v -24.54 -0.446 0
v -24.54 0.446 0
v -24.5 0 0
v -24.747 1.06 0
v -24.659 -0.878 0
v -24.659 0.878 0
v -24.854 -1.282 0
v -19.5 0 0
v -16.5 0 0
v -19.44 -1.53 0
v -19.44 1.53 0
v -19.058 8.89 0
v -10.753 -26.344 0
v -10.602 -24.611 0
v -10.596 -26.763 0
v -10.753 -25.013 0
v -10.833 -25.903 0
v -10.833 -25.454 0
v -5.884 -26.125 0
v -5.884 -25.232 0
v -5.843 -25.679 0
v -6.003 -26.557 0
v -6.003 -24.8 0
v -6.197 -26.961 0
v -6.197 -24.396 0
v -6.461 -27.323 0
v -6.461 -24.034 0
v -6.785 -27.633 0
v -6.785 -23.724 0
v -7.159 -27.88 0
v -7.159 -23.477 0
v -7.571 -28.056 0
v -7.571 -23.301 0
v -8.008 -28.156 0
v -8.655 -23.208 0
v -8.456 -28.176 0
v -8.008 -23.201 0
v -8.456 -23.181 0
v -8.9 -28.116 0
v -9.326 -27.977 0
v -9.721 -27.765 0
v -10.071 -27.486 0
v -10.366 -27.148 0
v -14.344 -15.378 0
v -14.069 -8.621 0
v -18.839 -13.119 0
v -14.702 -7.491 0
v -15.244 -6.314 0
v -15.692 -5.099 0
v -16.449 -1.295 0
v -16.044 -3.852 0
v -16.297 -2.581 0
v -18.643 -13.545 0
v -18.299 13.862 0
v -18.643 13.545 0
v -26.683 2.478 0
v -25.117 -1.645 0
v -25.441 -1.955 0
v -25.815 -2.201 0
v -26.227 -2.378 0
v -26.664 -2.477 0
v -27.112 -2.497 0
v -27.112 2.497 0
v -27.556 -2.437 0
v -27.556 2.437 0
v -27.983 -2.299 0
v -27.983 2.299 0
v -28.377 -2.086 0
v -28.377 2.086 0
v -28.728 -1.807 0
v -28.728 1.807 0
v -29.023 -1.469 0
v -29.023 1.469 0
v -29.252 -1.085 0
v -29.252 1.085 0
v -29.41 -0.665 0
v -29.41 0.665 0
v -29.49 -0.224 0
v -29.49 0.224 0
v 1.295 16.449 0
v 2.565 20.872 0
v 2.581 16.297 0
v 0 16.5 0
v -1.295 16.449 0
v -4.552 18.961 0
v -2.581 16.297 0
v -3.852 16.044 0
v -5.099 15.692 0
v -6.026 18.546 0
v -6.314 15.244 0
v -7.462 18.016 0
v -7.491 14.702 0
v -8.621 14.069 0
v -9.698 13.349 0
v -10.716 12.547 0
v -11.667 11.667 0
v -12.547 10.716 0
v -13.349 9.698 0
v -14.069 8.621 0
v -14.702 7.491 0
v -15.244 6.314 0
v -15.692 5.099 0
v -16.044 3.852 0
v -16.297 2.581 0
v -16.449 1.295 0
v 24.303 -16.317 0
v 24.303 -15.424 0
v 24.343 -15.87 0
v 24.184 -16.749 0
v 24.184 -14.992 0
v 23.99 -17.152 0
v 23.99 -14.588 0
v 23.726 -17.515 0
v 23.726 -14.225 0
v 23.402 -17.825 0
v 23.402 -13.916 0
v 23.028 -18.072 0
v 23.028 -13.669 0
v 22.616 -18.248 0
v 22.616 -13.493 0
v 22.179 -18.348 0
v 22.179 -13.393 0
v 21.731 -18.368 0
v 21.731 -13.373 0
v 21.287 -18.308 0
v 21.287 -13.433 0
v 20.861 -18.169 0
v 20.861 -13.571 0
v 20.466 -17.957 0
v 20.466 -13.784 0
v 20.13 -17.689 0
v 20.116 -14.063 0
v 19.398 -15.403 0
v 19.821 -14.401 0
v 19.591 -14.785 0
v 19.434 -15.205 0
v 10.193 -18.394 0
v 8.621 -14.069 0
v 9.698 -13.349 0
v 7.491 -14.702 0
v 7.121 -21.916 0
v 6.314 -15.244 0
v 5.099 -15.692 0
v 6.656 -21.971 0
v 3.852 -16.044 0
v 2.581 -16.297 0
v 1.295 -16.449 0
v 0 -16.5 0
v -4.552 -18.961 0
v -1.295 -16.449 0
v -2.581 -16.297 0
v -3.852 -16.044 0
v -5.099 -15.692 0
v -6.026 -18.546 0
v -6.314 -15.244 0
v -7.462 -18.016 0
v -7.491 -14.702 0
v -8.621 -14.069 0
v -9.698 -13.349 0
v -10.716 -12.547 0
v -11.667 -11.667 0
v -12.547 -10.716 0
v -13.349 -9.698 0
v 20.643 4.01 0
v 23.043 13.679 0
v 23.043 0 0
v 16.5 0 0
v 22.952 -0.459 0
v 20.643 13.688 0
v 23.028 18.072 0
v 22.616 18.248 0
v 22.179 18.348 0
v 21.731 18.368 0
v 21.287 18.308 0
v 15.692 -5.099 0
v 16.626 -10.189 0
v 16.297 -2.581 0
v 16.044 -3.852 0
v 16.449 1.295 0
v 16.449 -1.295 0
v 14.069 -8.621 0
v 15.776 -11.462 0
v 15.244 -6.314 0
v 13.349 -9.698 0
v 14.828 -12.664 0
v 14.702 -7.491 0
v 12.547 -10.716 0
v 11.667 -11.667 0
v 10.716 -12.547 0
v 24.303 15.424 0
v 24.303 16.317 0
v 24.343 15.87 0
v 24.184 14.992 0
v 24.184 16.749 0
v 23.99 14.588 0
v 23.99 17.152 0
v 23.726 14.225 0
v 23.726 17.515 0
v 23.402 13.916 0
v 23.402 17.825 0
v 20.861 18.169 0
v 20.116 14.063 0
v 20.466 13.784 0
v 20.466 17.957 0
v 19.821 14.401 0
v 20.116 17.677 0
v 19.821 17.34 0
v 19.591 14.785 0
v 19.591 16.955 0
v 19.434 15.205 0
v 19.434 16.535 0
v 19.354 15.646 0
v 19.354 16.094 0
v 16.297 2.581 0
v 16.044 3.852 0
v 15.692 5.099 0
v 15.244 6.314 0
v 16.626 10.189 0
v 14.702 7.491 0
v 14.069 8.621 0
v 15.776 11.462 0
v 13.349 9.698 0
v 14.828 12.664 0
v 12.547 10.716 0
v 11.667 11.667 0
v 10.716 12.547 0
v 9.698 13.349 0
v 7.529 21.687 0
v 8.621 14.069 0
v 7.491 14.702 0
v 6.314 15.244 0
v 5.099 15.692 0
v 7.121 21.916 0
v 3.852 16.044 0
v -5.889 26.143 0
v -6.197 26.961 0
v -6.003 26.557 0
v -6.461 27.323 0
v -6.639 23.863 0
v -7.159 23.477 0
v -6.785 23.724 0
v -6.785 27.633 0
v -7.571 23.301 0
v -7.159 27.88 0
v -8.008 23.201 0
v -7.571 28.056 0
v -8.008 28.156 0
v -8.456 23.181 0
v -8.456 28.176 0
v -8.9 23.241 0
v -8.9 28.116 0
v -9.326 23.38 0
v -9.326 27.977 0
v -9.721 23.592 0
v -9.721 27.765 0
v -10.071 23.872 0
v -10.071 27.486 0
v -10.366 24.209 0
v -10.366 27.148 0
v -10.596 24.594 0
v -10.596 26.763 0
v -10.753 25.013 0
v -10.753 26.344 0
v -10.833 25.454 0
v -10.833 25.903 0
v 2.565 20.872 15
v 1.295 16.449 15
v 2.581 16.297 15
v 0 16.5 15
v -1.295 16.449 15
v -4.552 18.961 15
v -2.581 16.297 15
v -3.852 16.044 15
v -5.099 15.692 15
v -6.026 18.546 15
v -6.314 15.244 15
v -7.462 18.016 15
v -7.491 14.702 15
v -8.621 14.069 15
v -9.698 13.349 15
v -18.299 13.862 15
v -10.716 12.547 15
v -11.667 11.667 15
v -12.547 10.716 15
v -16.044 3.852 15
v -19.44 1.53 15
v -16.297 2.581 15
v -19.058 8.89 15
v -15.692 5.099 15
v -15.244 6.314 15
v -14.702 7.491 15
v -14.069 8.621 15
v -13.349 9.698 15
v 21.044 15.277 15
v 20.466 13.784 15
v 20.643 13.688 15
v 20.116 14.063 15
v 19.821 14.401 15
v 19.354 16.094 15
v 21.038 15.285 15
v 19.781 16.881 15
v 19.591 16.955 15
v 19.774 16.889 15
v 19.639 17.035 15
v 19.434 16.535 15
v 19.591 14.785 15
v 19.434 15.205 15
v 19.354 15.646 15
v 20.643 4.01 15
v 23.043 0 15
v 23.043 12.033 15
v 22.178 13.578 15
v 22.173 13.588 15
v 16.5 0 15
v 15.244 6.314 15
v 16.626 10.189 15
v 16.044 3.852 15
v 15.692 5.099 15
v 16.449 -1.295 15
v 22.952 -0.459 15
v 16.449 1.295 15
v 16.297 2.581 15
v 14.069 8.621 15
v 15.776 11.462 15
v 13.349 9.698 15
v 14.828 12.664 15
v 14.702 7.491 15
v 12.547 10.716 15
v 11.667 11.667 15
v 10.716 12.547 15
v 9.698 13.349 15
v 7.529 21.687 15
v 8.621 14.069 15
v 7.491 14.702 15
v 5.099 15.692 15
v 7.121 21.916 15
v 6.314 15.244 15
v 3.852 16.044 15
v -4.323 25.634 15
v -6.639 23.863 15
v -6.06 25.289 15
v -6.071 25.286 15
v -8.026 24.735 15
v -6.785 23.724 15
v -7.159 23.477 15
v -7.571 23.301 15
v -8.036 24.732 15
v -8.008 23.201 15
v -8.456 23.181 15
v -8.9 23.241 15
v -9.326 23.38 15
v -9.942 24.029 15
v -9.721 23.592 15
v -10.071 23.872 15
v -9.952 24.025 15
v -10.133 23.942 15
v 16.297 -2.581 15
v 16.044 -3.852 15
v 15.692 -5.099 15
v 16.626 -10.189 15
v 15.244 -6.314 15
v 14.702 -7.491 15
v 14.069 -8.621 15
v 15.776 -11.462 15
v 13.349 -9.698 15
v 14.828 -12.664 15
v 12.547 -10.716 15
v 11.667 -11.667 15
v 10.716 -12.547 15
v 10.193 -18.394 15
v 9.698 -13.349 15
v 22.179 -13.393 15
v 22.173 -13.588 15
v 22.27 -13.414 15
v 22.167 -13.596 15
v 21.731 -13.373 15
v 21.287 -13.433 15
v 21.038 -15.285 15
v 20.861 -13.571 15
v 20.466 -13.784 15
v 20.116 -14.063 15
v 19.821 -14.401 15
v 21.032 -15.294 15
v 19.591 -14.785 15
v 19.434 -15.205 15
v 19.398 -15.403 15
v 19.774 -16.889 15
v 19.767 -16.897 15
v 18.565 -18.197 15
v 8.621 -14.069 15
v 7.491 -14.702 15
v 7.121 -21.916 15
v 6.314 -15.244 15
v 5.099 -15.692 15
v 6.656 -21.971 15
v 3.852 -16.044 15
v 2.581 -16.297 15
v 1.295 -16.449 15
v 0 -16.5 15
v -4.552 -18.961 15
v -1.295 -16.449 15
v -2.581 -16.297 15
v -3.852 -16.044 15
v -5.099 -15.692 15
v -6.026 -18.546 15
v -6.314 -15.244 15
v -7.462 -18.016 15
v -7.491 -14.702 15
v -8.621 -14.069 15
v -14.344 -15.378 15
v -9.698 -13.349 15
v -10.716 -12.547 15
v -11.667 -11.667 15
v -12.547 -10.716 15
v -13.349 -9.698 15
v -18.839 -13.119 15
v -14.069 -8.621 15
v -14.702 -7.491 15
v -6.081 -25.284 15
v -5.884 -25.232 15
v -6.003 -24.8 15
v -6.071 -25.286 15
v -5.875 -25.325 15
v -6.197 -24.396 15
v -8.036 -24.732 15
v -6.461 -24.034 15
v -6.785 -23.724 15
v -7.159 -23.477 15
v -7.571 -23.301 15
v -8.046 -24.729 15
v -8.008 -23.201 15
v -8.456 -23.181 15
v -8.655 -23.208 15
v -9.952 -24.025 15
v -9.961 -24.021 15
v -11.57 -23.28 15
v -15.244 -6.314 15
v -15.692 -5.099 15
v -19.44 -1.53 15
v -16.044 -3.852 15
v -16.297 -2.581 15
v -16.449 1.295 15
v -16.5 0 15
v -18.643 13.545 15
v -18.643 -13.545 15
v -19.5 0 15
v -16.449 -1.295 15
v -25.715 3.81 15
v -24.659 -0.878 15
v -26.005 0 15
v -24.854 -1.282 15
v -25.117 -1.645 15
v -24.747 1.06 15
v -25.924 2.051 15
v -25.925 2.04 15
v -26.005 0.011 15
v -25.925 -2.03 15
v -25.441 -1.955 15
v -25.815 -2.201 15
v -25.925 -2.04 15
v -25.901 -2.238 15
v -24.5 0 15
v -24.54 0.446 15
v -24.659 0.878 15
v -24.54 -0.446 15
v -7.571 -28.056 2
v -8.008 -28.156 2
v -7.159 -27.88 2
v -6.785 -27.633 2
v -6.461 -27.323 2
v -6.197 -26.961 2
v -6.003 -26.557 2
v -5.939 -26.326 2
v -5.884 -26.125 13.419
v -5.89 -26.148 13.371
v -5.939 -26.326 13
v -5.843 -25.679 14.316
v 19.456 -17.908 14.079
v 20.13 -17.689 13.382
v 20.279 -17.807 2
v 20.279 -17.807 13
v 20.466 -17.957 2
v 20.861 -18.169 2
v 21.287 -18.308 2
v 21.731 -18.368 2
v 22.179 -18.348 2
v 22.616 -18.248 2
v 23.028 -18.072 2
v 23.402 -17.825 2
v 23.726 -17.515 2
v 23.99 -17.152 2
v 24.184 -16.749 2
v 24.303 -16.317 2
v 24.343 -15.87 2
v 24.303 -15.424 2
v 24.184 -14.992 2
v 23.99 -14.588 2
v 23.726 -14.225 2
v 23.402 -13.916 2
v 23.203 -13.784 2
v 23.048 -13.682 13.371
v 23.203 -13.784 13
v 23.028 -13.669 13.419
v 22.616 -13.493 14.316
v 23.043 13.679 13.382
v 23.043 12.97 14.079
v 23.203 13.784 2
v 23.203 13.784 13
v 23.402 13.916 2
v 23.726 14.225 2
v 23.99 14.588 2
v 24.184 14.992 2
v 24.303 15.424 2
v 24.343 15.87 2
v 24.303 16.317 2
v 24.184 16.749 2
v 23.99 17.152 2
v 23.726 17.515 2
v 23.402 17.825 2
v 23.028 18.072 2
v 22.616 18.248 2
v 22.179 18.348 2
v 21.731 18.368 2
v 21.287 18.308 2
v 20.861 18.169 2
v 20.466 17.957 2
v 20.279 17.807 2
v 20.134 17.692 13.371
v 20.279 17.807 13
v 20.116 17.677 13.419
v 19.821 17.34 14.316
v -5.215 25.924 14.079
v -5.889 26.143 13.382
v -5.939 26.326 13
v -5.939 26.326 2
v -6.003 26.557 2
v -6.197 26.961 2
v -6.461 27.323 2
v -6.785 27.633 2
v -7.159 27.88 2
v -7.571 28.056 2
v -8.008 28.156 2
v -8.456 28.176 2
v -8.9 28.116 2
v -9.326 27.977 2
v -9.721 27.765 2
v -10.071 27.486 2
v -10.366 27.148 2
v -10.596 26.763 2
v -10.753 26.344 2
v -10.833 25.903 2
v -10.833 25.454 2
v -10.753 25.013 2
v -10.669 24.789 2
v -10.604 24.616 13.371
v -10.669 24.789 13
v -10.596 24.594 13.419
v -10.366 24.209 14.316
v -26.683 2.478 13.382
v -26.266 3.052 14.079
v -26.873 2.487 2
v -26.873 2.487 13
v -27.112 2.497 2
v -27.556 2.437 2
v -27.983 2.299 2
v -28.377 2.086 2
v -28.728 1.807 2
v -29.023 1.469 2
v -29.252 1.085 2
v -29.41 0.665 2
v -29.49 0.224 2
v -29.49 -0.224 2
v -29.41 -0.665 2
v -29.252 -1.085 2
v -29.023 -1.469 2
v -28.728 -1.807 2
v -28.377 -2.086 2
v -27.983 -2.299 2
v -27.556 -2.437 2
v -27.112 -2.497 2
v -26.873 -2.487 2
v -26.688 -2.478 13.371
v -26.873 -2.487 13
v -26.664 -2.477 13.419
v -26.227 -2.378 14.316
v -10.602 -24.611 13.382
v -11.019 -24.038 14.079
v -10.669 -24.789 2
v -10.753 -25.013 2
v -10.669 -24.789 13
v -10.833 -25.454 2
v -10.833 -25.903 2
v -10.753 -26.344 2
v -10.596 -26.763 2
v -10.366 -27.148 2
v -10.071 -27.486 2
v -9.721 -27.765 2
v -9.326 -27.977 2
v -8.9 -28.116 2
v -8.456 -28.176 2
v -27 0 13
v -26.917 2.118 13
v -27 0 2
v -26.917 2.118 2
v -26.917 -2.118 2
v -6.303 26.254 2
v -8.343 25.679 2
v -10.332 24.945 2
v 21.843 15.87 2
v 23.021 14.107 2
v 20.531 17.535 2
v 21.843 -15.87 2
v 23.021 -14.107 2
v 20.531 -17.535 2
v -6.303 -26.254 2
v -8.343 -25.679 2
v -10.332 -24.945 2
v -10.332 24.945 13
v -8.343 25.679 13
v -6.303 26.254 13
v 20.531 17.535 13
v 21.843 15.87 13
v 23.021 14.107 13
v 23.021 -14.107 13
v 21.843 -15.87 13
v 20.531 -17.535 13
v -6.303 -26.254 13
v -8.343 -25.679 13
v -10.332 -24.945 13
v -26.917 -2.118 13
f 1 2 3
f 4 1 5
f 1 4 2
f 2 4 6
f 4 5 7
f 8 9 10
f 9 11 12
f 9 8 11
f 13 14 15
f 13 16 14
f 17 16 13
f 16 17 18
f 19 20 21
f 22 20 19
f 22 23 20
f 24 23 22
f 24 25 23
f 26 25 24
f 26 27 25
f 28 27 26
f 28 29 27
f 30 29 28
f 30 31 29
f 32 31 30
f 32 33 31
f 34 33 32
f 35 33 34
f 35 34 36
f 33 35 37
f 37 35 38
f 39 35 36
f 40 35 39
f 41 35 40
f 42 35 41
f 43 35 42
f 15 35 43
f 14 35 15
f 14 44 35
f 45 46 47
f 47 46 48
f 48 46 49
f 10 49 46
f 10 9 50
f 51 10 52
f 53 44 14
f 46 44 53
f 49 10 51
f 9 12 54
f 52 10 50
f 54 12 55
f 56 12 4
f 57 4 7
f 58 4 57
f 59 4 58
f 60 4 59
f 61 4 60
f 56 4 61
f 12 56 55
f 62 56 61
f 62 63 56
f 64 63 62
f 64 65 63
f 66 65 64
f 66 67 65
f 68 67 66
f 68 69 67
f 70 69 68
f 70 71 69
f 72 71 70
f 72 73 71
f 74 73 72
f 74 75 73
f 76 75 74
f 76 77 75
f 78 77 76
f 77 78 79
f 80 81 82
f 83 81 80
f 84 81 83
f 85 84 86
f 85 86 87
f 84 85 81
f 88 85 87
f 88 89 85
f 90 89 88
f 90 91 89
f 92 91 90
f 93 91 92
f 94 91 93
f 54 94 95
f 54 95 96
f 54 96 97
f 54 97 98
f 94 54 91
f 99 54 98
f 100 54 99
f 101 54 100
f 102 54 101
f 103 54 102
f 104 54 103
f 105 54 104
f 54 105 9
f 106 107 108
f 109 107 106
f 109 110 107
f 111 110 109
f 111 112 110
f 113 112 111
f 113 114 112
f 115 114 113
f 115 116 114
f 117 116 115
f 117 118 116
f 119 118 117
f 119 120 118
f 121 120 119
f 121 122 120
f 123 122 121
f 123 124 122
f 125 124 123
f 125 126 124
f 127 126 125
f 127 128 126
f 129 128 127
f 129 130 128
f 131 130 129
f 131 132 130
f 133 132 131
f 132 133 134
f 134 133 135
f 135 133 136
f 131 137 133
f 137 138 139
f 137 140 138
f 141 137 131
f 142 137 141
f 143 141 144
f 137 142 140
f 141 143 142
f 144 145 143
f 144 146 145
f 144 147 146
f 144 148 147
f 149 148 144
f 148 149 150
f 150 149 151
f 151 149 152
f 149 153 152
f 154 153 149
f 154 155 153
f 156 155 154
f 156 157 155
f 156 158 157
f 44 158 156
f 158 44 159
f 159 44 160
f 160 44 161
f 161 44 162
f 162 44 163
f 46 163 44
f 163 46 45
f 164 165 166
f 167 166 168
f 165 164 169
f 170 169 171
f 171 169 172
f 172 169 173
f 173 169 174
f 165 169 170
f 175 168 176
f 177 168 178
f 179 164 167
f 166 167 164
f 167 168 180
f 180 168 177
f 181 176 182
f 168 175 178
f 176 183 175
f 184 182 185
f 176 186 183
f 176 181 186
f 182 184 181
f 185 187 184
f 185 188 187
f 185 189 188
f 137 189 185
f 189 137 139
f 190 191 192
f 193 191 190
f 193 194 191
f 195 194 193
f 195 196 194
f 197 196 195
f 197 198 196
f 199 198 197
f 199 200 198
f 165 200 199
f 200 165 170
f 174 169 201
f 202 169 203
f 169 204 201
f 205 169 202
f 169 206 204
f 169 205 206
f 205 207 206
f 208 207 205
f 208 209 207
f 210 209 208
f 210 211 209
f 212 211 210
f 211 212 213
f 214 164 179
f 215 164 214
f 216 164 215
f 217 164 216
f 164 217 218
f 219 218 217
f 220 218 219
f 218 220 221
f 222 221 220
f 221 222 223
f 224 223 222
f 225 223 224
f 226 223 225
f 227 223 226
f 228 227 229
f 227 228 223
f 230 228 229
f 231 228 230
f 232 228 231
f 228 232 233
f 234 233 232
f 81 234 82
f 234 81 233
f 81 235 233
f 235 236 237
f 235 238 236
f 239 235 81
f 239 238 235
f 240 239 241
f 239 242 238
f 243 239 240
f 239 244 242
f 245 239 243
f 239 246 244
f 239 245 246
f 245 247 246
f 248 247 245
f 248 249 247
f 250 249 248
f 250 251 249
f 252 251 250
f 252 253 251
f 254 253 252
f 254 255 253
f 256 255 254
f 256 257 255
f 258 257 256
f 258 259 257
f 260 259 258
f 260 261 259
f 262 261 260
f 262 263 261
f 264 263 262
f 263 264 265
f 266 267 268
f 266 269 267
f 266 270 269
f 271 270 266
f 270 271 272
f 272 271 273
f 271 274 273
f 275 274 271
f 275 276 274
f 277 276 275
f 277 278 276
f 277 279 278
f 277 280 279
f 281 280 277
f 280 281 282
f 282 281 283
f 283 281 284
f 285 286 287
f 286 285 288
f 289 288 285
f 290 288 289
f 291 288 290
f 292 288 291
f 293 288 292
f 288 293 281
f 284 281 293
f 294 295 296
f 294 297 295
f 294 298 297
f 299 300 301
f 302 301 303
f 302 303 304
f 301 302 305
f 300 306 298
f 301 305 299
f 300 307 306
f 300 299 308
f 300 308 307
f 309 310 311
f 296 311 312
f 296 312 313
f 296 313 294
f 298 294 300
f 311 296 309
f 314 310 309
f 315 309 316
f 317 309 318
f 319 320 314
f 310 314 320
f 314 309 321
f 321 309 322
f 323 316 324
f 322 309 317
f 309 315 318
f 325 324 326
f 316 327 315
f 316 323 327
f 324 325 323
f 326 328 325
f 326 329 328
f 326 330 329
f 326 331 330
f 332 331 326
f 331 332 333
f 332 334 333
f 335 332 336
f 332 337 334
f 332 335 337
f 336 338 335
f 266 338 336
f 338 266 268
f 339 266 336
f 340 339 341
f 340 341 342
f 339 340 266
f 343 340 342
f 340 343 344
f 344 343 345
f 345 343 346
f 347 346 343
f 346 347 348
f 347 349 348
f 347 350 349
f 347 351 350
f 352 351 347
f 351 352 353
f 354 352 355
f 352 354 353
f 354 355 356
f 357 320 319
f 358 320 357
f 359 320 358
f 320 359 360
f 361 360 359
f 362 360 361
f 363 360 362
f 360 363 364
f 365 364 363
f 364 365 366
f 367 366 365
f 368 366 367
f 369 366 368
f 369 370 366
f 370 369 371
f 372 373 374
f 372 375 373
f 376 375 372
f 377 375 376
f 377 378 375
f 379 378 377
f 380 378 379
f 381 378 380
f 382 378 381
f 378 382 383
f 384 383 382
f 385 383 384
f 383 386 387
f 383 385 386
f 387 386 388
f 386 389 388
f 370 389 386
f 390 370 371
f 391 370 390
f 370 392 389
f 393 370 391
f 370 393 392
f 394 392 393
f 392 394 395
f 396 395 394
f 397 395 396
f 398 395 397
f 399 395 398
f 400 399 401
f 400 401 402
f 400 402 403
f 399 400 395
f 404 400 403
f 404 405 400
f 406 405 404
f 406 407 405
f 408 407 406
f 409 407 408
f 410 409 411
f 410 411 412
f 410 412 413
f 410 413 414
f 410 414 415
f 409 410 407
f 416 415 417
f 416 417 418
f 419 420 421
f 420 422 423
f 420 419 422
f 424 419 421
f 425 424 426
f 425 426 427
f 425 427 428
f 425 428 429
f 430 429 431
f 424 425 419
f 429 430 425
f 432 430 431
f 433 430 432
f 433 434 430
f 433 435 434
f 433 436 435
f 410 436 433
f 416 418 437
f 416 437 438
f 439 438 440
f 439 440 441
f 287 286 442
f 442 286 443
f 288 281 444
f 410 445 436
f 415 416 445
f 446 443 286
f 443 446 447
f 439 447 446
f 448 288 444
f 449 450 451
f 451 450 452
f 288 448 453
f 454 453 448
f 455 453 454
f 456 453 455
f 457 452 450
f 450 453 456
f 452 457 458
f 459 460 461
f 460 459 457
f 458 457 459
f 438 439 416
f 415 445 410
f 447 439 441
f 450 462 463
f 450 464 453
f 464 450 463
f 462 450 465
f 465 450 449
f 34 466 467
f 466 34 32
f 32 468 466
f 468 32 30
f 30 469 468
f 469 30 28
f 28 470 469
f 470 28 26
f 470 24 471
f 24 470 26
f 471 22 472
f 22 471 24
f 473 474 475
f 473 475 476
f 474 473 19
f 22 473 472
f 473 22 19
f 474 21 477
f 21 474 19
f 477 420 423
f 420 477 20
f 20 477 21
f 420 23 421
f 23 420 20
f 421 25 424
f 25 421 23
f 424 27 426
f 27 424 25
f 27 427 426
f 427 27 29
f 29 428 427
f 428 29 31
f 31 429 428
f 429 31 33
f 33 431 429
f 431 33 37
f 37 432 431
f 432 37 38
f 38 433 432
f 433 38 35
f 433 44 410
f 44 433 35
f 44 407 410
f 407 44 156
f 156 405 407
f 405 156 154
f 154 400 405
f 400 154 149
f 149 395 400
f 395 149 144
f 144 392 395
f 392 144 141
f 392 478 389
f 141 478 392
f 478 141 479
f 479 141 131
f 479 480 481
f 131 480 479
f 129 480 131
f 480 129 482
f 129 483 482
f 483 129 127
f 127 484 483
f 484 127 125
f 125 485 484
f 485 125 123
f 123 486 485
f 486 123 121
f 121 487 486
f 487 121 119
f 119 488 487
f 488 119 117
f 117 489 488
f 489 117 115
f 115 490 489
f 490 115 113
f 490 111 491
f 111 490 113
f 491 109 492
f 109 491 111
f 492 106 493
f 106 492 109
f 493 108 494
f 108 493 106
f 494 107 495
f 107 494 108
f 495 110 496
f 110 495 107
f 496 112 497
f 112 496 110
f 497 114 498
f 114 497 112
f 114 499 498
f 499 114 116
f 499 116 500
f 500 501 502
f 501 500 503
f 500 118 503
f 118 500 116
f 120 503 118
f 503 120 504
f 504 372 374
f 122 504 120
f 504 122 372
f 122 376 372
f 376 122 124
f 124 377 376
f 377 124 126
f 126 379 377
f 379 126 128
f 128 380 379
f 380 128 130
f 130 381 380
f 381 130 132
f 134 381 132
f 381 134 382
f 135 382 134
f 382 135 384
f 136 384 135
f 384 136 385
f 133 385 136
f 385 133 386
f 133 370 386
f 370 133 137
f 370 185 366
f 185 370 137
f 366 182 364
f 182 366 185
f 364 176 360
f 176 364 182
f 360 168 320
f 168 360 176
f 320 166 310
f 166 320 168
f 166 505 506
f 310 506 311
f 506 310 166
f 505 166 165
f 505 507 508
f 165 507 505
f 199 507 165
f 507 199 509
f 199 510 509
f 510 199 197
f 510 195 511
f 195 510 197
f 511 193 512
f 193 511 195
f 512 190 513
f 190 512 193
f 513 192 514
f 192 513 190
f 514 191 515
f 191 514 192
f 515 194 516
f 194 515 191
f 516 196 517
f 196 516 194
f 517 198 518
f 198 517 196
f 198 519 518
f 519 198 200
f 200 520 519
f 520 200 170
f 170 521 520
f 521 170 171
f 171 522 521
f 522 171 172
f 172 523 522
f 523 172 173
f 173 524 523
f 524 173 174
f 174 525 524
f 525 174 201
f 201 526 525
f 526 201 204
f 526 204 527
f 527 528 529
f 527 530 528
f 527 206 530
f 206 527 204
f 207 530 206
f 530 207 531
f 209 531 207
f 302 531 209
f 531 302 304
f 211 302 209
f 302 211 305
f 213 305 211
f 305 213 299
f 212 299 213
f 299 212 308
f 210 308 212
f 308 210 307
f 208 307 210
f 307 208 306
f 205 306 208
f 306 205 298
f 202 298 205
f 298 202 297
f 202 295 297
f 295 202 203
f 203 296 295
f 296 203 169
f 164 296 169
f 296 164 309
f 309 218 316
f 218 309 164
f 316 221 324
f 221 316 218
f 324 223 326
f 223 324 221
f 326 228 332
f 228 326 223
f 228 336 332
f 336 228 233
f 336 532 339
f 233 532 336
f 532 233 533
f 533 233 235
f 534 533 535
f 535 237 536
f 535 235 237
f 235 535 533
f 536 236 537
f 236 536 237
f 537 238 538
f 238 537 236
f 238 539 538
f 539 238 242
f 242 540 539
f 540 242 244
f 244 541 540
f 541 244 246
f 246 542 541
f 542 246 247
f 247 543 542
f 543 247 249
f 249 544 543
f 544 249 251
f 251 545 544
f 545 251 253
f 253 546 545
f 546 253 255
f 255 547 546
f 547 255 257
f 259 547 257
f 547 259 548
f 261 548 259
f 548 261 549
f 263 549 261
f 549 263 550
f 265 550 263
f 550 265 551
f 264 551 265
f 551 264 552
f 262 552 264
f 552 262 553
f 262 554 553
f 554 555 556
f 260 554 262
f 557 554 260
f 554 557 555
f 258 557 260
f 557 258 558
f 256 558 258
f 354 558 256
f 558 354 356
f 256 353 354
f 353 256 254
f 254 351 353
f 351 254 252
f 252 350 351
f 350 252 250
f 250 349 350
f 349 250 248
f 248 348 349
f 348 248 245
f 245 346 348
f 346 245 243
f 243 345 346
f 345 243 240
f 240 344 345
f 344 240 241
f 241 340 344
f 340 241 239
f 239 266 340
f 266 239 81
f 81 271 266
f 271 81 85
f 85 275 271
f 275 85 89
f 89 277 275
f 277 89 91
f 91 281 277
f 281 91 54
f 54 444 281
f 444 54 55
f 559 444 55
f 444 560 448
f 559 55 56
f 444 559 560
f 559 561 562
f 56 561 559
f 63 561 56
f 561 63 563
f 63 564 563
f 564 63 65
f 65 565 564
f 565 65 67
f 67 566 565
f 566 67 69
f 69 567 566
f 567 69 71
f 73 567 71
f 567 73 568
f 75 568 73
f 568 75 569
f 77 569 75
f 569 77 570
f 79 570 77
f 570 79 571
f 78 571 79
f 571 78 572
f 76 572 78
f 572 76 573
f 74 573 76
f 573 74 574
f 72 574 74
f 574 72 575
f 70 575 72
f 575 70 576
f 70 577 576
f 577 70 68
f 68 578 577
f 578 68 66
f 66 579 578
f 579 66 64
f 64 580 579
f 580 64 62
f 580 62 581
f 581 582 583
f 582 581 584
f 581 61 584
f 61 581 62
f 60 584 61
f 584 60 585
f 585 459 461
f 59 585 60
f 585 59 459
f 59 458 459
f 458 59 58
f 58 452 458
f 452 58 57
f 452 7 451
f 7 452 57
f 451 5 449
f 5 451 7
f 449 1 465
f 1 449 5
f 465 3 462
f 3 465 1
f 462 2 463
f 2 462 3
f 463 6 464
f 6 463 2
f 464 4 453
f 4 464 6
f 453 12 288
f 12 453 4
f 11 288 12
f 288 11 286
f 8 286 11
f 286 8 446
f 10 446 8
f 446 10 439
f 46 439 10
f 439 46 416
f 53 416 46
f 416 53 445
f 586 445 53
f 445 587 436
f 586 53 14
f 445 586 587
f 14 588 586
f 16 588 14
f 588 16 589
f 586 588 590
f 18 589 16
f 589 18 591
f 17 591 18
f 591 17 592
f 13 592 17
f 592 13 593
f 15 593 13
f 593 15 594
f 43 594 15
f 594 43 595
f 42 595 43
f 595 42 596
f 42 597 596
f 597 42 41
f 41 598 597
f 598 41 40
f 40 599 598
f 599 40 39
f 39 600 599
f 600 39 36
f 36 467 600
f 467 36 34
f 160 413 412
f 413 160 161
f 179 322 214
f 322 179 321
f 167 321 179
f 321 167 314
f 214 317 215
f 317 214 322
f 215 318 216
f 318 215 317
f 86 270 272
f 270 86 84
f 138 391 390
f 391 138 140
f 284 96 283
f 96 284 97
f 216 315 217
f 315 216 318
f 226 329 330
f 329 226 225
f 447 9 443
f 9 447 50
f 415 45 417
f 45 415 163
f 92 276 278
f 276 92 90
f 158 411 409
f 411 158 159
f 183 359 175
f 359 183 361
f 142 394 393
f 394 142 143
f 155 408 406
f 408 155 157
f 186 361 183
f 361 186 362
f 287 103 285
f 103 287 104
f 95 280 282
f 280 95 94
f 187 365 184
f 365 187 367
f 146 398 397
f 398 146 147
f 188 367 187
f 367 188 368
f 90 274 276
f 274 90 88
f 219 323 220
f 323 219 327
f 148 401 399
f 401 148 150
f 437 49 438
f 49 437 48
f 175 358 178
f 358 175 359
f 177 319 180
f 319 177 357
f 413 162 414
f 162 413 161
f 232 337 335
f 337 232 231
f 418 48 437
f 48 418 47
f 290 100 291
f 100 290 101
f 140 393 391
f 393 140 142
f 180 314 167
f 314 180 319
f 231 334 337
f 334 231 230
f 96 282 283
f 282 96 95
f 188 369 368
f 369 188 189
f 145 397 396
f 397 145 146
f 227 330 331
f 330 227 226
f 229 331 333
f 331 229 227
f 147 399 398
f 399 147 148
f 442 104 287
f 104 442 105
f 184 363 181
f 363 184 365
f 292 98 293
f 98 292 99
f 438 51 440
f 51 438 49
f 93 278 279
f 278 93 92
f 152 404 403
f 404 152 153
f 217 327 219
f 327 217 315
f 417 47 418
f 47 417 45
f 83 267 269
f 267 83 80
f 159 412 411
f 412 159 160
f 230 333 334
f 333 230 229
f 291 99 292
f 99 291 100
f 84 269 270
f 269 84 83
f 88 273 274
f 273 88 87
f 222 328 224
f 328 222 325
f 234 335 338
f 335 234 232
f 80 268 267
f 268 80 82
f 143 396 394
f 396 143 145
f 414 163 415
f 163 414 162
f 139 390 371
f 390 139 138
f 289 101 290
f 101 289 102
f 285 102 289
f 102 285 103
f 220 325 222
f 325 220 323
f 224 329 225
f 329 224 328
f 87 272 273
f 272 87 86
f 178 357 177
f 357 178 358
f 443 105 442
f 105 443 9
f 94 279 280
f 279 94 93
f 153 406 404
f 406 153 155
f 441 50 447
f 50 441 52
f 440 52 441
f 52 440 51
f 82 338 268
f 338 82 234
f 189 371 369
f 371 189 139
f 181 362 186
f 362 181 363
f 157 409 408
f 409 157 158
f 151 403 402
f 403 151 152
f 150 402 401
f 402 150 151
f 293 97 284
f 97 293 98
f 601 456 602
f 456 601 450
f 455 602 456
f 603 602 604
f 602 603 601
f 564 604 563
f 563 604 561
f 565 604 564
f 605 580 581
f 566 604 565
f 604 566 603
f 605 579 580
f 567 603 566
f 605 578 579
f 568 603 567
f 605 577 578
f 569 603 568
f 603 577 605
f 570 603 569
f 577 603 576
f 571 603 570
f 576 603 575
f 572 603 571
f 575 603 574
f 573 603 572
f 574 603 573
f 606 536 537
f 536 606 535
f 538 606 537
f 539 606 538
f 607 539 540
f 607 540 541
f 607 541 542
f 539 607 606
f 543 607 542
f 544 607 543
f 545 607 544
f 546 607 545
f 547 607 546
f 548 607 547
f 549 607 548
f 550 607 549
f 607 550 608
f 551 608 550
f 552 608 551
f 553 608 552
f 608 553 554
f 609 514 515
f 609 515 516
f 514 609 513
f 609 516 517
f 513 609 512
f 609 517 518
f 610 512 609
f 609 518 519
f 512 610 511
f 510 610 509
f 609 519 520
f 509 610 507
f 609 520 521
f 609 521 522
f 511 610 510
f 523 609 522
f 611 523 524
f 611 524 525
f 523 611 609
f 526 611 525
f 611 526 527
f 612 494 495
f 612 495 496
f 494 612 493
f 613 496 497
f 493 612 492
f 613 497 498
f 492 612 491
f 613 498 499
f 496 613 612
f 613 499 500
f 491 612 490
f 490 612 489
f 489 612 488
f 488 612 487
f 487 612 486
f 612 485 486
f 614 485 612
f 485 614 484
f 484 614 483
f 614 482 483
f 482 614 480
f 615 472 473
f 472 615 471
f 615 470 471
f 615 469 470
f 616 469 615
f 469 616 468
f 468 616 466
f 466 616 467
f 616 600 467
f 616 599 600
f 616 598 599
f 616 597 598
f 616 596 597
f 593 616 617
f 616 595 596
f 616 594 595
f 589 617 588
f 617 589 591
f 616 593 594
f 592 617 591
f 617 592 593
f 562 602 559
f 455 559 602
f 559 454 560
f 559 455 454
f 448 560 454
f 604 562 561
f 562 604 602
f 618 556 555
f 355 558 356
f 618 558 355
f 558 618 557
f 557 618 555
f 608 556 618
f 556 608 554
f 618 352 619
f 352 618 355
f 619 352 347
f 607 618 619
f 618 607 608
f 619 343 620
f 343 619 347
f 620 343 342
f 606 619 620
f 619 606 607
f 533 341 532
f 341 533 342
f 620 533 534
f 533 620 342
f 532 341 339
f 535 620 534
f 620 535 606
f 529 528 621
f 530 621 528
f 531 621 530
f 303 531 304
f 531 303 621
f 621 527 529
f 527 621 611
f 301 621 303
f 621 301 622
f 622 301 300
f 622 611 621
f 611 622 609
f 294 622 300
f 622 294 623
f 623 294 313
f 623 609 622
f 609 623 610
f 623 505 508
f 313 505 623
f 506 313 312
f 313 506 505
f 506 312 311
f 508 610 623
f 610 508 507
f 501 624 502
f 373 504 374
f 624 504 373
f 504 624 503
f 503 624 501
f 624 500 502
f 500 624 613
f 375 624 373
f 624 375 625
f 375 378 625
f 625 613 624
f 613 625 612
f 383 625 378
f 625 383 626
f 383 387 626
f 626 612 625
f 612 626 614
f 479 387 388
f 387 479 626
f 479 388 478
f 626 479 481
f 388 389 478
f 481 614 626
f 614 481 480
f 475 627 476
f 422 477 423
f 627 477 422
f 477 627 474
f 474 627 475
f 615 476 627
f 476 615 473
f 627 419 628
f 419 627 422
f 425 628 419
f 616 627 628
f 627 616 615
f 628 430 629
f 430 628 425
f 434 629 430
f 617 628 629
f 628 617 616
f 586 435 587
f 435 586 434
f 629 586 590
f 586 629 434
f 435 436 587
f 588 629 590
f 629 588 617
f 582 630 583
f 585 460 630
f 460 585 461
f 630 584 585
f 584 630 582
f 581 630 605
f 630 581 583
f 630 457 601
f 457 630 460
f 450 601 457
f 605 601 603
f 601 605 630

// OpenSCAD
// 'Customizable Spool Adapter' by wstein 
// is licensed under the Attribution - Non-Commercial - Share Alike license. 
// Version 1.3.1 (c) November 2015
// please refer the complete license here: http://creativecommons.org/licenses/by-sa/3.0/legalcode
//
// V1.4: inner hole fix (see http://www.thingiverse.com/thing:1151473)
// V1.3.1: Bug fixed for latest customizer
// V1.3: Customizer creation failure fixed. Some smaller issues fixed. More slider used. New license cc-by-sa!
// V1.2: part handling optimized
// V1.1a: UI optimized
// V1.1: new star shape

// preview[view:south, tilt:top diagonal]

//to show. This setting is only relevant for preview.
part="right"; //[right:Right,left:Left,straight:Straight,star_right:Star Right,star_left:Star Left]

//depended on the inner and outer diameter, you may also need to change the "Arms" settings to get a perfect working adapter. 
tube_diameter=32; //[0:0.5:75]
spool_diameter=53; //[0:1:150]
height=15; //[0:100]
number_of_arms=5; //[3:10]
function get_number_of_arms() = (part == "straight" && number_of_arms % 2 > 0 ? 1 : 0) + number_of_arms;

/*[Advanced]*/

inner_diameter_backlash=1.0; //[0:0.1:5]
collar_thickness=2.0; //[0:0.5:10]
chamfer_depth=2.0; //[0:0.5:20]
wall=3.0; //[0:0.1:10]

/*[Arms]*/

//I used 2mm on 32/53 Adapter with 6 arms and 2.4mm with 5 arms. It depends on the length.
arm_thickness=2.4; //[0:0.1:5]
//in mm. The adapter should fit tight to the spool, so the outer diameter is enlarged by this value.
arm_compression=1.0; //[0:0.1:5]
// in mm
arm_end_diameter=5.0; //[0:0.5:20]

/*[Expert]*/
quality=80; //[60:Normal,80:Good,100:High]

function get_part_index() = search([part], ["right","left","straight","star_right","star_left"])[0];

/*[Hidden]*/


inner_diameter=tube_diameter+inner_diameter_backlash;
outer_diameter=spool_diameter+arm_compression;

outer_shape=[

    [outer_diameter/2+arm_end_diameter+.1,collar_thickness],
    [outer_diameter/2,collar_thickness],
    [outer_diameter/2,height-chamfer_depth],
    [spool_diameter/2-.5,height+0.01],
    [outer_diameter/2+arm_end_diameter+.1,height+0.01],
];

number=part == "straight"?get_number_of_arms()/2:get_number_of_arms();

arm_degree=360/get_number_of_arms();
degree=360/number;

difference()
{   
    linear_extrude(convexity=20,height=height)
    union()
    {
        if(get_part_index()>2)
        for(a=[0:degree:359])
        hull()
        {
            circle(r=inner_diameter/2+wall,$fn=quality);
            
            rotate([0,0,a])
            translate([cos_arm,0,0])
            circle(r=arm_thickness/2,$fn=arm_thickness*7);
        }
        else
        hull()
        {
            circle(r=inner_diameter/2+wall,$fn=quality);
            
            for(a=[0:degree:359])
            rotate([0,0,a])
            translate([cos_arm,0,0])
            circle(r=arm_thickness/2,$fn=arm_thickness*7);
        }
        
        for(a=[0:degree:359])
        rotate([0,0,a])
        for(i=[0:len(arm_paths[get_part_index()])-2])
        hull()
        for(j=[i:i+1])
        translate(arm_paths[get_part_index()][j])
        circle(r=arm_thickness/2,$fn=arm_thickness*7);
        
        for(a=[0:360/get_number_of_arms():359])
        rotate([0,0,a])
        translate([cos_arm,sin_arm])
        circle(r=arm_end_diameter/2,$fn=arm_end_diameter*7);       
    }
    
    translate([0,0,-1])
    cylinder(r=inner_diameter/2, h=height+2, $fn=quality);

    rotate_extrude(convexity=20,$fn=quality)
    polygon(outer_shape);
}

sin_arm=sin(arm_degree/2)*outer_diameter/2;
cos_arm=cos(arm_degree/2)*outer_diameter/2;
arm_paths=[
    // right
    [
        [cos_arm,0],
        [cos_arm,sin_arm],
    ],
    // left
    [
        [cos_arm,0],
        [cos_arm,-sin_arm],
    ],
    // straight
    [
        [cos_arm,sin_arm],
        [cos_arm,-sin_arm],
    ],
    // right star
    [
        [cos_arm,0],
        [cos_arm,sin_arm],
    ],
    // left star
    [
        [cos_arm,0],
        [cos_arm,-sin_arm],
    ],
];


